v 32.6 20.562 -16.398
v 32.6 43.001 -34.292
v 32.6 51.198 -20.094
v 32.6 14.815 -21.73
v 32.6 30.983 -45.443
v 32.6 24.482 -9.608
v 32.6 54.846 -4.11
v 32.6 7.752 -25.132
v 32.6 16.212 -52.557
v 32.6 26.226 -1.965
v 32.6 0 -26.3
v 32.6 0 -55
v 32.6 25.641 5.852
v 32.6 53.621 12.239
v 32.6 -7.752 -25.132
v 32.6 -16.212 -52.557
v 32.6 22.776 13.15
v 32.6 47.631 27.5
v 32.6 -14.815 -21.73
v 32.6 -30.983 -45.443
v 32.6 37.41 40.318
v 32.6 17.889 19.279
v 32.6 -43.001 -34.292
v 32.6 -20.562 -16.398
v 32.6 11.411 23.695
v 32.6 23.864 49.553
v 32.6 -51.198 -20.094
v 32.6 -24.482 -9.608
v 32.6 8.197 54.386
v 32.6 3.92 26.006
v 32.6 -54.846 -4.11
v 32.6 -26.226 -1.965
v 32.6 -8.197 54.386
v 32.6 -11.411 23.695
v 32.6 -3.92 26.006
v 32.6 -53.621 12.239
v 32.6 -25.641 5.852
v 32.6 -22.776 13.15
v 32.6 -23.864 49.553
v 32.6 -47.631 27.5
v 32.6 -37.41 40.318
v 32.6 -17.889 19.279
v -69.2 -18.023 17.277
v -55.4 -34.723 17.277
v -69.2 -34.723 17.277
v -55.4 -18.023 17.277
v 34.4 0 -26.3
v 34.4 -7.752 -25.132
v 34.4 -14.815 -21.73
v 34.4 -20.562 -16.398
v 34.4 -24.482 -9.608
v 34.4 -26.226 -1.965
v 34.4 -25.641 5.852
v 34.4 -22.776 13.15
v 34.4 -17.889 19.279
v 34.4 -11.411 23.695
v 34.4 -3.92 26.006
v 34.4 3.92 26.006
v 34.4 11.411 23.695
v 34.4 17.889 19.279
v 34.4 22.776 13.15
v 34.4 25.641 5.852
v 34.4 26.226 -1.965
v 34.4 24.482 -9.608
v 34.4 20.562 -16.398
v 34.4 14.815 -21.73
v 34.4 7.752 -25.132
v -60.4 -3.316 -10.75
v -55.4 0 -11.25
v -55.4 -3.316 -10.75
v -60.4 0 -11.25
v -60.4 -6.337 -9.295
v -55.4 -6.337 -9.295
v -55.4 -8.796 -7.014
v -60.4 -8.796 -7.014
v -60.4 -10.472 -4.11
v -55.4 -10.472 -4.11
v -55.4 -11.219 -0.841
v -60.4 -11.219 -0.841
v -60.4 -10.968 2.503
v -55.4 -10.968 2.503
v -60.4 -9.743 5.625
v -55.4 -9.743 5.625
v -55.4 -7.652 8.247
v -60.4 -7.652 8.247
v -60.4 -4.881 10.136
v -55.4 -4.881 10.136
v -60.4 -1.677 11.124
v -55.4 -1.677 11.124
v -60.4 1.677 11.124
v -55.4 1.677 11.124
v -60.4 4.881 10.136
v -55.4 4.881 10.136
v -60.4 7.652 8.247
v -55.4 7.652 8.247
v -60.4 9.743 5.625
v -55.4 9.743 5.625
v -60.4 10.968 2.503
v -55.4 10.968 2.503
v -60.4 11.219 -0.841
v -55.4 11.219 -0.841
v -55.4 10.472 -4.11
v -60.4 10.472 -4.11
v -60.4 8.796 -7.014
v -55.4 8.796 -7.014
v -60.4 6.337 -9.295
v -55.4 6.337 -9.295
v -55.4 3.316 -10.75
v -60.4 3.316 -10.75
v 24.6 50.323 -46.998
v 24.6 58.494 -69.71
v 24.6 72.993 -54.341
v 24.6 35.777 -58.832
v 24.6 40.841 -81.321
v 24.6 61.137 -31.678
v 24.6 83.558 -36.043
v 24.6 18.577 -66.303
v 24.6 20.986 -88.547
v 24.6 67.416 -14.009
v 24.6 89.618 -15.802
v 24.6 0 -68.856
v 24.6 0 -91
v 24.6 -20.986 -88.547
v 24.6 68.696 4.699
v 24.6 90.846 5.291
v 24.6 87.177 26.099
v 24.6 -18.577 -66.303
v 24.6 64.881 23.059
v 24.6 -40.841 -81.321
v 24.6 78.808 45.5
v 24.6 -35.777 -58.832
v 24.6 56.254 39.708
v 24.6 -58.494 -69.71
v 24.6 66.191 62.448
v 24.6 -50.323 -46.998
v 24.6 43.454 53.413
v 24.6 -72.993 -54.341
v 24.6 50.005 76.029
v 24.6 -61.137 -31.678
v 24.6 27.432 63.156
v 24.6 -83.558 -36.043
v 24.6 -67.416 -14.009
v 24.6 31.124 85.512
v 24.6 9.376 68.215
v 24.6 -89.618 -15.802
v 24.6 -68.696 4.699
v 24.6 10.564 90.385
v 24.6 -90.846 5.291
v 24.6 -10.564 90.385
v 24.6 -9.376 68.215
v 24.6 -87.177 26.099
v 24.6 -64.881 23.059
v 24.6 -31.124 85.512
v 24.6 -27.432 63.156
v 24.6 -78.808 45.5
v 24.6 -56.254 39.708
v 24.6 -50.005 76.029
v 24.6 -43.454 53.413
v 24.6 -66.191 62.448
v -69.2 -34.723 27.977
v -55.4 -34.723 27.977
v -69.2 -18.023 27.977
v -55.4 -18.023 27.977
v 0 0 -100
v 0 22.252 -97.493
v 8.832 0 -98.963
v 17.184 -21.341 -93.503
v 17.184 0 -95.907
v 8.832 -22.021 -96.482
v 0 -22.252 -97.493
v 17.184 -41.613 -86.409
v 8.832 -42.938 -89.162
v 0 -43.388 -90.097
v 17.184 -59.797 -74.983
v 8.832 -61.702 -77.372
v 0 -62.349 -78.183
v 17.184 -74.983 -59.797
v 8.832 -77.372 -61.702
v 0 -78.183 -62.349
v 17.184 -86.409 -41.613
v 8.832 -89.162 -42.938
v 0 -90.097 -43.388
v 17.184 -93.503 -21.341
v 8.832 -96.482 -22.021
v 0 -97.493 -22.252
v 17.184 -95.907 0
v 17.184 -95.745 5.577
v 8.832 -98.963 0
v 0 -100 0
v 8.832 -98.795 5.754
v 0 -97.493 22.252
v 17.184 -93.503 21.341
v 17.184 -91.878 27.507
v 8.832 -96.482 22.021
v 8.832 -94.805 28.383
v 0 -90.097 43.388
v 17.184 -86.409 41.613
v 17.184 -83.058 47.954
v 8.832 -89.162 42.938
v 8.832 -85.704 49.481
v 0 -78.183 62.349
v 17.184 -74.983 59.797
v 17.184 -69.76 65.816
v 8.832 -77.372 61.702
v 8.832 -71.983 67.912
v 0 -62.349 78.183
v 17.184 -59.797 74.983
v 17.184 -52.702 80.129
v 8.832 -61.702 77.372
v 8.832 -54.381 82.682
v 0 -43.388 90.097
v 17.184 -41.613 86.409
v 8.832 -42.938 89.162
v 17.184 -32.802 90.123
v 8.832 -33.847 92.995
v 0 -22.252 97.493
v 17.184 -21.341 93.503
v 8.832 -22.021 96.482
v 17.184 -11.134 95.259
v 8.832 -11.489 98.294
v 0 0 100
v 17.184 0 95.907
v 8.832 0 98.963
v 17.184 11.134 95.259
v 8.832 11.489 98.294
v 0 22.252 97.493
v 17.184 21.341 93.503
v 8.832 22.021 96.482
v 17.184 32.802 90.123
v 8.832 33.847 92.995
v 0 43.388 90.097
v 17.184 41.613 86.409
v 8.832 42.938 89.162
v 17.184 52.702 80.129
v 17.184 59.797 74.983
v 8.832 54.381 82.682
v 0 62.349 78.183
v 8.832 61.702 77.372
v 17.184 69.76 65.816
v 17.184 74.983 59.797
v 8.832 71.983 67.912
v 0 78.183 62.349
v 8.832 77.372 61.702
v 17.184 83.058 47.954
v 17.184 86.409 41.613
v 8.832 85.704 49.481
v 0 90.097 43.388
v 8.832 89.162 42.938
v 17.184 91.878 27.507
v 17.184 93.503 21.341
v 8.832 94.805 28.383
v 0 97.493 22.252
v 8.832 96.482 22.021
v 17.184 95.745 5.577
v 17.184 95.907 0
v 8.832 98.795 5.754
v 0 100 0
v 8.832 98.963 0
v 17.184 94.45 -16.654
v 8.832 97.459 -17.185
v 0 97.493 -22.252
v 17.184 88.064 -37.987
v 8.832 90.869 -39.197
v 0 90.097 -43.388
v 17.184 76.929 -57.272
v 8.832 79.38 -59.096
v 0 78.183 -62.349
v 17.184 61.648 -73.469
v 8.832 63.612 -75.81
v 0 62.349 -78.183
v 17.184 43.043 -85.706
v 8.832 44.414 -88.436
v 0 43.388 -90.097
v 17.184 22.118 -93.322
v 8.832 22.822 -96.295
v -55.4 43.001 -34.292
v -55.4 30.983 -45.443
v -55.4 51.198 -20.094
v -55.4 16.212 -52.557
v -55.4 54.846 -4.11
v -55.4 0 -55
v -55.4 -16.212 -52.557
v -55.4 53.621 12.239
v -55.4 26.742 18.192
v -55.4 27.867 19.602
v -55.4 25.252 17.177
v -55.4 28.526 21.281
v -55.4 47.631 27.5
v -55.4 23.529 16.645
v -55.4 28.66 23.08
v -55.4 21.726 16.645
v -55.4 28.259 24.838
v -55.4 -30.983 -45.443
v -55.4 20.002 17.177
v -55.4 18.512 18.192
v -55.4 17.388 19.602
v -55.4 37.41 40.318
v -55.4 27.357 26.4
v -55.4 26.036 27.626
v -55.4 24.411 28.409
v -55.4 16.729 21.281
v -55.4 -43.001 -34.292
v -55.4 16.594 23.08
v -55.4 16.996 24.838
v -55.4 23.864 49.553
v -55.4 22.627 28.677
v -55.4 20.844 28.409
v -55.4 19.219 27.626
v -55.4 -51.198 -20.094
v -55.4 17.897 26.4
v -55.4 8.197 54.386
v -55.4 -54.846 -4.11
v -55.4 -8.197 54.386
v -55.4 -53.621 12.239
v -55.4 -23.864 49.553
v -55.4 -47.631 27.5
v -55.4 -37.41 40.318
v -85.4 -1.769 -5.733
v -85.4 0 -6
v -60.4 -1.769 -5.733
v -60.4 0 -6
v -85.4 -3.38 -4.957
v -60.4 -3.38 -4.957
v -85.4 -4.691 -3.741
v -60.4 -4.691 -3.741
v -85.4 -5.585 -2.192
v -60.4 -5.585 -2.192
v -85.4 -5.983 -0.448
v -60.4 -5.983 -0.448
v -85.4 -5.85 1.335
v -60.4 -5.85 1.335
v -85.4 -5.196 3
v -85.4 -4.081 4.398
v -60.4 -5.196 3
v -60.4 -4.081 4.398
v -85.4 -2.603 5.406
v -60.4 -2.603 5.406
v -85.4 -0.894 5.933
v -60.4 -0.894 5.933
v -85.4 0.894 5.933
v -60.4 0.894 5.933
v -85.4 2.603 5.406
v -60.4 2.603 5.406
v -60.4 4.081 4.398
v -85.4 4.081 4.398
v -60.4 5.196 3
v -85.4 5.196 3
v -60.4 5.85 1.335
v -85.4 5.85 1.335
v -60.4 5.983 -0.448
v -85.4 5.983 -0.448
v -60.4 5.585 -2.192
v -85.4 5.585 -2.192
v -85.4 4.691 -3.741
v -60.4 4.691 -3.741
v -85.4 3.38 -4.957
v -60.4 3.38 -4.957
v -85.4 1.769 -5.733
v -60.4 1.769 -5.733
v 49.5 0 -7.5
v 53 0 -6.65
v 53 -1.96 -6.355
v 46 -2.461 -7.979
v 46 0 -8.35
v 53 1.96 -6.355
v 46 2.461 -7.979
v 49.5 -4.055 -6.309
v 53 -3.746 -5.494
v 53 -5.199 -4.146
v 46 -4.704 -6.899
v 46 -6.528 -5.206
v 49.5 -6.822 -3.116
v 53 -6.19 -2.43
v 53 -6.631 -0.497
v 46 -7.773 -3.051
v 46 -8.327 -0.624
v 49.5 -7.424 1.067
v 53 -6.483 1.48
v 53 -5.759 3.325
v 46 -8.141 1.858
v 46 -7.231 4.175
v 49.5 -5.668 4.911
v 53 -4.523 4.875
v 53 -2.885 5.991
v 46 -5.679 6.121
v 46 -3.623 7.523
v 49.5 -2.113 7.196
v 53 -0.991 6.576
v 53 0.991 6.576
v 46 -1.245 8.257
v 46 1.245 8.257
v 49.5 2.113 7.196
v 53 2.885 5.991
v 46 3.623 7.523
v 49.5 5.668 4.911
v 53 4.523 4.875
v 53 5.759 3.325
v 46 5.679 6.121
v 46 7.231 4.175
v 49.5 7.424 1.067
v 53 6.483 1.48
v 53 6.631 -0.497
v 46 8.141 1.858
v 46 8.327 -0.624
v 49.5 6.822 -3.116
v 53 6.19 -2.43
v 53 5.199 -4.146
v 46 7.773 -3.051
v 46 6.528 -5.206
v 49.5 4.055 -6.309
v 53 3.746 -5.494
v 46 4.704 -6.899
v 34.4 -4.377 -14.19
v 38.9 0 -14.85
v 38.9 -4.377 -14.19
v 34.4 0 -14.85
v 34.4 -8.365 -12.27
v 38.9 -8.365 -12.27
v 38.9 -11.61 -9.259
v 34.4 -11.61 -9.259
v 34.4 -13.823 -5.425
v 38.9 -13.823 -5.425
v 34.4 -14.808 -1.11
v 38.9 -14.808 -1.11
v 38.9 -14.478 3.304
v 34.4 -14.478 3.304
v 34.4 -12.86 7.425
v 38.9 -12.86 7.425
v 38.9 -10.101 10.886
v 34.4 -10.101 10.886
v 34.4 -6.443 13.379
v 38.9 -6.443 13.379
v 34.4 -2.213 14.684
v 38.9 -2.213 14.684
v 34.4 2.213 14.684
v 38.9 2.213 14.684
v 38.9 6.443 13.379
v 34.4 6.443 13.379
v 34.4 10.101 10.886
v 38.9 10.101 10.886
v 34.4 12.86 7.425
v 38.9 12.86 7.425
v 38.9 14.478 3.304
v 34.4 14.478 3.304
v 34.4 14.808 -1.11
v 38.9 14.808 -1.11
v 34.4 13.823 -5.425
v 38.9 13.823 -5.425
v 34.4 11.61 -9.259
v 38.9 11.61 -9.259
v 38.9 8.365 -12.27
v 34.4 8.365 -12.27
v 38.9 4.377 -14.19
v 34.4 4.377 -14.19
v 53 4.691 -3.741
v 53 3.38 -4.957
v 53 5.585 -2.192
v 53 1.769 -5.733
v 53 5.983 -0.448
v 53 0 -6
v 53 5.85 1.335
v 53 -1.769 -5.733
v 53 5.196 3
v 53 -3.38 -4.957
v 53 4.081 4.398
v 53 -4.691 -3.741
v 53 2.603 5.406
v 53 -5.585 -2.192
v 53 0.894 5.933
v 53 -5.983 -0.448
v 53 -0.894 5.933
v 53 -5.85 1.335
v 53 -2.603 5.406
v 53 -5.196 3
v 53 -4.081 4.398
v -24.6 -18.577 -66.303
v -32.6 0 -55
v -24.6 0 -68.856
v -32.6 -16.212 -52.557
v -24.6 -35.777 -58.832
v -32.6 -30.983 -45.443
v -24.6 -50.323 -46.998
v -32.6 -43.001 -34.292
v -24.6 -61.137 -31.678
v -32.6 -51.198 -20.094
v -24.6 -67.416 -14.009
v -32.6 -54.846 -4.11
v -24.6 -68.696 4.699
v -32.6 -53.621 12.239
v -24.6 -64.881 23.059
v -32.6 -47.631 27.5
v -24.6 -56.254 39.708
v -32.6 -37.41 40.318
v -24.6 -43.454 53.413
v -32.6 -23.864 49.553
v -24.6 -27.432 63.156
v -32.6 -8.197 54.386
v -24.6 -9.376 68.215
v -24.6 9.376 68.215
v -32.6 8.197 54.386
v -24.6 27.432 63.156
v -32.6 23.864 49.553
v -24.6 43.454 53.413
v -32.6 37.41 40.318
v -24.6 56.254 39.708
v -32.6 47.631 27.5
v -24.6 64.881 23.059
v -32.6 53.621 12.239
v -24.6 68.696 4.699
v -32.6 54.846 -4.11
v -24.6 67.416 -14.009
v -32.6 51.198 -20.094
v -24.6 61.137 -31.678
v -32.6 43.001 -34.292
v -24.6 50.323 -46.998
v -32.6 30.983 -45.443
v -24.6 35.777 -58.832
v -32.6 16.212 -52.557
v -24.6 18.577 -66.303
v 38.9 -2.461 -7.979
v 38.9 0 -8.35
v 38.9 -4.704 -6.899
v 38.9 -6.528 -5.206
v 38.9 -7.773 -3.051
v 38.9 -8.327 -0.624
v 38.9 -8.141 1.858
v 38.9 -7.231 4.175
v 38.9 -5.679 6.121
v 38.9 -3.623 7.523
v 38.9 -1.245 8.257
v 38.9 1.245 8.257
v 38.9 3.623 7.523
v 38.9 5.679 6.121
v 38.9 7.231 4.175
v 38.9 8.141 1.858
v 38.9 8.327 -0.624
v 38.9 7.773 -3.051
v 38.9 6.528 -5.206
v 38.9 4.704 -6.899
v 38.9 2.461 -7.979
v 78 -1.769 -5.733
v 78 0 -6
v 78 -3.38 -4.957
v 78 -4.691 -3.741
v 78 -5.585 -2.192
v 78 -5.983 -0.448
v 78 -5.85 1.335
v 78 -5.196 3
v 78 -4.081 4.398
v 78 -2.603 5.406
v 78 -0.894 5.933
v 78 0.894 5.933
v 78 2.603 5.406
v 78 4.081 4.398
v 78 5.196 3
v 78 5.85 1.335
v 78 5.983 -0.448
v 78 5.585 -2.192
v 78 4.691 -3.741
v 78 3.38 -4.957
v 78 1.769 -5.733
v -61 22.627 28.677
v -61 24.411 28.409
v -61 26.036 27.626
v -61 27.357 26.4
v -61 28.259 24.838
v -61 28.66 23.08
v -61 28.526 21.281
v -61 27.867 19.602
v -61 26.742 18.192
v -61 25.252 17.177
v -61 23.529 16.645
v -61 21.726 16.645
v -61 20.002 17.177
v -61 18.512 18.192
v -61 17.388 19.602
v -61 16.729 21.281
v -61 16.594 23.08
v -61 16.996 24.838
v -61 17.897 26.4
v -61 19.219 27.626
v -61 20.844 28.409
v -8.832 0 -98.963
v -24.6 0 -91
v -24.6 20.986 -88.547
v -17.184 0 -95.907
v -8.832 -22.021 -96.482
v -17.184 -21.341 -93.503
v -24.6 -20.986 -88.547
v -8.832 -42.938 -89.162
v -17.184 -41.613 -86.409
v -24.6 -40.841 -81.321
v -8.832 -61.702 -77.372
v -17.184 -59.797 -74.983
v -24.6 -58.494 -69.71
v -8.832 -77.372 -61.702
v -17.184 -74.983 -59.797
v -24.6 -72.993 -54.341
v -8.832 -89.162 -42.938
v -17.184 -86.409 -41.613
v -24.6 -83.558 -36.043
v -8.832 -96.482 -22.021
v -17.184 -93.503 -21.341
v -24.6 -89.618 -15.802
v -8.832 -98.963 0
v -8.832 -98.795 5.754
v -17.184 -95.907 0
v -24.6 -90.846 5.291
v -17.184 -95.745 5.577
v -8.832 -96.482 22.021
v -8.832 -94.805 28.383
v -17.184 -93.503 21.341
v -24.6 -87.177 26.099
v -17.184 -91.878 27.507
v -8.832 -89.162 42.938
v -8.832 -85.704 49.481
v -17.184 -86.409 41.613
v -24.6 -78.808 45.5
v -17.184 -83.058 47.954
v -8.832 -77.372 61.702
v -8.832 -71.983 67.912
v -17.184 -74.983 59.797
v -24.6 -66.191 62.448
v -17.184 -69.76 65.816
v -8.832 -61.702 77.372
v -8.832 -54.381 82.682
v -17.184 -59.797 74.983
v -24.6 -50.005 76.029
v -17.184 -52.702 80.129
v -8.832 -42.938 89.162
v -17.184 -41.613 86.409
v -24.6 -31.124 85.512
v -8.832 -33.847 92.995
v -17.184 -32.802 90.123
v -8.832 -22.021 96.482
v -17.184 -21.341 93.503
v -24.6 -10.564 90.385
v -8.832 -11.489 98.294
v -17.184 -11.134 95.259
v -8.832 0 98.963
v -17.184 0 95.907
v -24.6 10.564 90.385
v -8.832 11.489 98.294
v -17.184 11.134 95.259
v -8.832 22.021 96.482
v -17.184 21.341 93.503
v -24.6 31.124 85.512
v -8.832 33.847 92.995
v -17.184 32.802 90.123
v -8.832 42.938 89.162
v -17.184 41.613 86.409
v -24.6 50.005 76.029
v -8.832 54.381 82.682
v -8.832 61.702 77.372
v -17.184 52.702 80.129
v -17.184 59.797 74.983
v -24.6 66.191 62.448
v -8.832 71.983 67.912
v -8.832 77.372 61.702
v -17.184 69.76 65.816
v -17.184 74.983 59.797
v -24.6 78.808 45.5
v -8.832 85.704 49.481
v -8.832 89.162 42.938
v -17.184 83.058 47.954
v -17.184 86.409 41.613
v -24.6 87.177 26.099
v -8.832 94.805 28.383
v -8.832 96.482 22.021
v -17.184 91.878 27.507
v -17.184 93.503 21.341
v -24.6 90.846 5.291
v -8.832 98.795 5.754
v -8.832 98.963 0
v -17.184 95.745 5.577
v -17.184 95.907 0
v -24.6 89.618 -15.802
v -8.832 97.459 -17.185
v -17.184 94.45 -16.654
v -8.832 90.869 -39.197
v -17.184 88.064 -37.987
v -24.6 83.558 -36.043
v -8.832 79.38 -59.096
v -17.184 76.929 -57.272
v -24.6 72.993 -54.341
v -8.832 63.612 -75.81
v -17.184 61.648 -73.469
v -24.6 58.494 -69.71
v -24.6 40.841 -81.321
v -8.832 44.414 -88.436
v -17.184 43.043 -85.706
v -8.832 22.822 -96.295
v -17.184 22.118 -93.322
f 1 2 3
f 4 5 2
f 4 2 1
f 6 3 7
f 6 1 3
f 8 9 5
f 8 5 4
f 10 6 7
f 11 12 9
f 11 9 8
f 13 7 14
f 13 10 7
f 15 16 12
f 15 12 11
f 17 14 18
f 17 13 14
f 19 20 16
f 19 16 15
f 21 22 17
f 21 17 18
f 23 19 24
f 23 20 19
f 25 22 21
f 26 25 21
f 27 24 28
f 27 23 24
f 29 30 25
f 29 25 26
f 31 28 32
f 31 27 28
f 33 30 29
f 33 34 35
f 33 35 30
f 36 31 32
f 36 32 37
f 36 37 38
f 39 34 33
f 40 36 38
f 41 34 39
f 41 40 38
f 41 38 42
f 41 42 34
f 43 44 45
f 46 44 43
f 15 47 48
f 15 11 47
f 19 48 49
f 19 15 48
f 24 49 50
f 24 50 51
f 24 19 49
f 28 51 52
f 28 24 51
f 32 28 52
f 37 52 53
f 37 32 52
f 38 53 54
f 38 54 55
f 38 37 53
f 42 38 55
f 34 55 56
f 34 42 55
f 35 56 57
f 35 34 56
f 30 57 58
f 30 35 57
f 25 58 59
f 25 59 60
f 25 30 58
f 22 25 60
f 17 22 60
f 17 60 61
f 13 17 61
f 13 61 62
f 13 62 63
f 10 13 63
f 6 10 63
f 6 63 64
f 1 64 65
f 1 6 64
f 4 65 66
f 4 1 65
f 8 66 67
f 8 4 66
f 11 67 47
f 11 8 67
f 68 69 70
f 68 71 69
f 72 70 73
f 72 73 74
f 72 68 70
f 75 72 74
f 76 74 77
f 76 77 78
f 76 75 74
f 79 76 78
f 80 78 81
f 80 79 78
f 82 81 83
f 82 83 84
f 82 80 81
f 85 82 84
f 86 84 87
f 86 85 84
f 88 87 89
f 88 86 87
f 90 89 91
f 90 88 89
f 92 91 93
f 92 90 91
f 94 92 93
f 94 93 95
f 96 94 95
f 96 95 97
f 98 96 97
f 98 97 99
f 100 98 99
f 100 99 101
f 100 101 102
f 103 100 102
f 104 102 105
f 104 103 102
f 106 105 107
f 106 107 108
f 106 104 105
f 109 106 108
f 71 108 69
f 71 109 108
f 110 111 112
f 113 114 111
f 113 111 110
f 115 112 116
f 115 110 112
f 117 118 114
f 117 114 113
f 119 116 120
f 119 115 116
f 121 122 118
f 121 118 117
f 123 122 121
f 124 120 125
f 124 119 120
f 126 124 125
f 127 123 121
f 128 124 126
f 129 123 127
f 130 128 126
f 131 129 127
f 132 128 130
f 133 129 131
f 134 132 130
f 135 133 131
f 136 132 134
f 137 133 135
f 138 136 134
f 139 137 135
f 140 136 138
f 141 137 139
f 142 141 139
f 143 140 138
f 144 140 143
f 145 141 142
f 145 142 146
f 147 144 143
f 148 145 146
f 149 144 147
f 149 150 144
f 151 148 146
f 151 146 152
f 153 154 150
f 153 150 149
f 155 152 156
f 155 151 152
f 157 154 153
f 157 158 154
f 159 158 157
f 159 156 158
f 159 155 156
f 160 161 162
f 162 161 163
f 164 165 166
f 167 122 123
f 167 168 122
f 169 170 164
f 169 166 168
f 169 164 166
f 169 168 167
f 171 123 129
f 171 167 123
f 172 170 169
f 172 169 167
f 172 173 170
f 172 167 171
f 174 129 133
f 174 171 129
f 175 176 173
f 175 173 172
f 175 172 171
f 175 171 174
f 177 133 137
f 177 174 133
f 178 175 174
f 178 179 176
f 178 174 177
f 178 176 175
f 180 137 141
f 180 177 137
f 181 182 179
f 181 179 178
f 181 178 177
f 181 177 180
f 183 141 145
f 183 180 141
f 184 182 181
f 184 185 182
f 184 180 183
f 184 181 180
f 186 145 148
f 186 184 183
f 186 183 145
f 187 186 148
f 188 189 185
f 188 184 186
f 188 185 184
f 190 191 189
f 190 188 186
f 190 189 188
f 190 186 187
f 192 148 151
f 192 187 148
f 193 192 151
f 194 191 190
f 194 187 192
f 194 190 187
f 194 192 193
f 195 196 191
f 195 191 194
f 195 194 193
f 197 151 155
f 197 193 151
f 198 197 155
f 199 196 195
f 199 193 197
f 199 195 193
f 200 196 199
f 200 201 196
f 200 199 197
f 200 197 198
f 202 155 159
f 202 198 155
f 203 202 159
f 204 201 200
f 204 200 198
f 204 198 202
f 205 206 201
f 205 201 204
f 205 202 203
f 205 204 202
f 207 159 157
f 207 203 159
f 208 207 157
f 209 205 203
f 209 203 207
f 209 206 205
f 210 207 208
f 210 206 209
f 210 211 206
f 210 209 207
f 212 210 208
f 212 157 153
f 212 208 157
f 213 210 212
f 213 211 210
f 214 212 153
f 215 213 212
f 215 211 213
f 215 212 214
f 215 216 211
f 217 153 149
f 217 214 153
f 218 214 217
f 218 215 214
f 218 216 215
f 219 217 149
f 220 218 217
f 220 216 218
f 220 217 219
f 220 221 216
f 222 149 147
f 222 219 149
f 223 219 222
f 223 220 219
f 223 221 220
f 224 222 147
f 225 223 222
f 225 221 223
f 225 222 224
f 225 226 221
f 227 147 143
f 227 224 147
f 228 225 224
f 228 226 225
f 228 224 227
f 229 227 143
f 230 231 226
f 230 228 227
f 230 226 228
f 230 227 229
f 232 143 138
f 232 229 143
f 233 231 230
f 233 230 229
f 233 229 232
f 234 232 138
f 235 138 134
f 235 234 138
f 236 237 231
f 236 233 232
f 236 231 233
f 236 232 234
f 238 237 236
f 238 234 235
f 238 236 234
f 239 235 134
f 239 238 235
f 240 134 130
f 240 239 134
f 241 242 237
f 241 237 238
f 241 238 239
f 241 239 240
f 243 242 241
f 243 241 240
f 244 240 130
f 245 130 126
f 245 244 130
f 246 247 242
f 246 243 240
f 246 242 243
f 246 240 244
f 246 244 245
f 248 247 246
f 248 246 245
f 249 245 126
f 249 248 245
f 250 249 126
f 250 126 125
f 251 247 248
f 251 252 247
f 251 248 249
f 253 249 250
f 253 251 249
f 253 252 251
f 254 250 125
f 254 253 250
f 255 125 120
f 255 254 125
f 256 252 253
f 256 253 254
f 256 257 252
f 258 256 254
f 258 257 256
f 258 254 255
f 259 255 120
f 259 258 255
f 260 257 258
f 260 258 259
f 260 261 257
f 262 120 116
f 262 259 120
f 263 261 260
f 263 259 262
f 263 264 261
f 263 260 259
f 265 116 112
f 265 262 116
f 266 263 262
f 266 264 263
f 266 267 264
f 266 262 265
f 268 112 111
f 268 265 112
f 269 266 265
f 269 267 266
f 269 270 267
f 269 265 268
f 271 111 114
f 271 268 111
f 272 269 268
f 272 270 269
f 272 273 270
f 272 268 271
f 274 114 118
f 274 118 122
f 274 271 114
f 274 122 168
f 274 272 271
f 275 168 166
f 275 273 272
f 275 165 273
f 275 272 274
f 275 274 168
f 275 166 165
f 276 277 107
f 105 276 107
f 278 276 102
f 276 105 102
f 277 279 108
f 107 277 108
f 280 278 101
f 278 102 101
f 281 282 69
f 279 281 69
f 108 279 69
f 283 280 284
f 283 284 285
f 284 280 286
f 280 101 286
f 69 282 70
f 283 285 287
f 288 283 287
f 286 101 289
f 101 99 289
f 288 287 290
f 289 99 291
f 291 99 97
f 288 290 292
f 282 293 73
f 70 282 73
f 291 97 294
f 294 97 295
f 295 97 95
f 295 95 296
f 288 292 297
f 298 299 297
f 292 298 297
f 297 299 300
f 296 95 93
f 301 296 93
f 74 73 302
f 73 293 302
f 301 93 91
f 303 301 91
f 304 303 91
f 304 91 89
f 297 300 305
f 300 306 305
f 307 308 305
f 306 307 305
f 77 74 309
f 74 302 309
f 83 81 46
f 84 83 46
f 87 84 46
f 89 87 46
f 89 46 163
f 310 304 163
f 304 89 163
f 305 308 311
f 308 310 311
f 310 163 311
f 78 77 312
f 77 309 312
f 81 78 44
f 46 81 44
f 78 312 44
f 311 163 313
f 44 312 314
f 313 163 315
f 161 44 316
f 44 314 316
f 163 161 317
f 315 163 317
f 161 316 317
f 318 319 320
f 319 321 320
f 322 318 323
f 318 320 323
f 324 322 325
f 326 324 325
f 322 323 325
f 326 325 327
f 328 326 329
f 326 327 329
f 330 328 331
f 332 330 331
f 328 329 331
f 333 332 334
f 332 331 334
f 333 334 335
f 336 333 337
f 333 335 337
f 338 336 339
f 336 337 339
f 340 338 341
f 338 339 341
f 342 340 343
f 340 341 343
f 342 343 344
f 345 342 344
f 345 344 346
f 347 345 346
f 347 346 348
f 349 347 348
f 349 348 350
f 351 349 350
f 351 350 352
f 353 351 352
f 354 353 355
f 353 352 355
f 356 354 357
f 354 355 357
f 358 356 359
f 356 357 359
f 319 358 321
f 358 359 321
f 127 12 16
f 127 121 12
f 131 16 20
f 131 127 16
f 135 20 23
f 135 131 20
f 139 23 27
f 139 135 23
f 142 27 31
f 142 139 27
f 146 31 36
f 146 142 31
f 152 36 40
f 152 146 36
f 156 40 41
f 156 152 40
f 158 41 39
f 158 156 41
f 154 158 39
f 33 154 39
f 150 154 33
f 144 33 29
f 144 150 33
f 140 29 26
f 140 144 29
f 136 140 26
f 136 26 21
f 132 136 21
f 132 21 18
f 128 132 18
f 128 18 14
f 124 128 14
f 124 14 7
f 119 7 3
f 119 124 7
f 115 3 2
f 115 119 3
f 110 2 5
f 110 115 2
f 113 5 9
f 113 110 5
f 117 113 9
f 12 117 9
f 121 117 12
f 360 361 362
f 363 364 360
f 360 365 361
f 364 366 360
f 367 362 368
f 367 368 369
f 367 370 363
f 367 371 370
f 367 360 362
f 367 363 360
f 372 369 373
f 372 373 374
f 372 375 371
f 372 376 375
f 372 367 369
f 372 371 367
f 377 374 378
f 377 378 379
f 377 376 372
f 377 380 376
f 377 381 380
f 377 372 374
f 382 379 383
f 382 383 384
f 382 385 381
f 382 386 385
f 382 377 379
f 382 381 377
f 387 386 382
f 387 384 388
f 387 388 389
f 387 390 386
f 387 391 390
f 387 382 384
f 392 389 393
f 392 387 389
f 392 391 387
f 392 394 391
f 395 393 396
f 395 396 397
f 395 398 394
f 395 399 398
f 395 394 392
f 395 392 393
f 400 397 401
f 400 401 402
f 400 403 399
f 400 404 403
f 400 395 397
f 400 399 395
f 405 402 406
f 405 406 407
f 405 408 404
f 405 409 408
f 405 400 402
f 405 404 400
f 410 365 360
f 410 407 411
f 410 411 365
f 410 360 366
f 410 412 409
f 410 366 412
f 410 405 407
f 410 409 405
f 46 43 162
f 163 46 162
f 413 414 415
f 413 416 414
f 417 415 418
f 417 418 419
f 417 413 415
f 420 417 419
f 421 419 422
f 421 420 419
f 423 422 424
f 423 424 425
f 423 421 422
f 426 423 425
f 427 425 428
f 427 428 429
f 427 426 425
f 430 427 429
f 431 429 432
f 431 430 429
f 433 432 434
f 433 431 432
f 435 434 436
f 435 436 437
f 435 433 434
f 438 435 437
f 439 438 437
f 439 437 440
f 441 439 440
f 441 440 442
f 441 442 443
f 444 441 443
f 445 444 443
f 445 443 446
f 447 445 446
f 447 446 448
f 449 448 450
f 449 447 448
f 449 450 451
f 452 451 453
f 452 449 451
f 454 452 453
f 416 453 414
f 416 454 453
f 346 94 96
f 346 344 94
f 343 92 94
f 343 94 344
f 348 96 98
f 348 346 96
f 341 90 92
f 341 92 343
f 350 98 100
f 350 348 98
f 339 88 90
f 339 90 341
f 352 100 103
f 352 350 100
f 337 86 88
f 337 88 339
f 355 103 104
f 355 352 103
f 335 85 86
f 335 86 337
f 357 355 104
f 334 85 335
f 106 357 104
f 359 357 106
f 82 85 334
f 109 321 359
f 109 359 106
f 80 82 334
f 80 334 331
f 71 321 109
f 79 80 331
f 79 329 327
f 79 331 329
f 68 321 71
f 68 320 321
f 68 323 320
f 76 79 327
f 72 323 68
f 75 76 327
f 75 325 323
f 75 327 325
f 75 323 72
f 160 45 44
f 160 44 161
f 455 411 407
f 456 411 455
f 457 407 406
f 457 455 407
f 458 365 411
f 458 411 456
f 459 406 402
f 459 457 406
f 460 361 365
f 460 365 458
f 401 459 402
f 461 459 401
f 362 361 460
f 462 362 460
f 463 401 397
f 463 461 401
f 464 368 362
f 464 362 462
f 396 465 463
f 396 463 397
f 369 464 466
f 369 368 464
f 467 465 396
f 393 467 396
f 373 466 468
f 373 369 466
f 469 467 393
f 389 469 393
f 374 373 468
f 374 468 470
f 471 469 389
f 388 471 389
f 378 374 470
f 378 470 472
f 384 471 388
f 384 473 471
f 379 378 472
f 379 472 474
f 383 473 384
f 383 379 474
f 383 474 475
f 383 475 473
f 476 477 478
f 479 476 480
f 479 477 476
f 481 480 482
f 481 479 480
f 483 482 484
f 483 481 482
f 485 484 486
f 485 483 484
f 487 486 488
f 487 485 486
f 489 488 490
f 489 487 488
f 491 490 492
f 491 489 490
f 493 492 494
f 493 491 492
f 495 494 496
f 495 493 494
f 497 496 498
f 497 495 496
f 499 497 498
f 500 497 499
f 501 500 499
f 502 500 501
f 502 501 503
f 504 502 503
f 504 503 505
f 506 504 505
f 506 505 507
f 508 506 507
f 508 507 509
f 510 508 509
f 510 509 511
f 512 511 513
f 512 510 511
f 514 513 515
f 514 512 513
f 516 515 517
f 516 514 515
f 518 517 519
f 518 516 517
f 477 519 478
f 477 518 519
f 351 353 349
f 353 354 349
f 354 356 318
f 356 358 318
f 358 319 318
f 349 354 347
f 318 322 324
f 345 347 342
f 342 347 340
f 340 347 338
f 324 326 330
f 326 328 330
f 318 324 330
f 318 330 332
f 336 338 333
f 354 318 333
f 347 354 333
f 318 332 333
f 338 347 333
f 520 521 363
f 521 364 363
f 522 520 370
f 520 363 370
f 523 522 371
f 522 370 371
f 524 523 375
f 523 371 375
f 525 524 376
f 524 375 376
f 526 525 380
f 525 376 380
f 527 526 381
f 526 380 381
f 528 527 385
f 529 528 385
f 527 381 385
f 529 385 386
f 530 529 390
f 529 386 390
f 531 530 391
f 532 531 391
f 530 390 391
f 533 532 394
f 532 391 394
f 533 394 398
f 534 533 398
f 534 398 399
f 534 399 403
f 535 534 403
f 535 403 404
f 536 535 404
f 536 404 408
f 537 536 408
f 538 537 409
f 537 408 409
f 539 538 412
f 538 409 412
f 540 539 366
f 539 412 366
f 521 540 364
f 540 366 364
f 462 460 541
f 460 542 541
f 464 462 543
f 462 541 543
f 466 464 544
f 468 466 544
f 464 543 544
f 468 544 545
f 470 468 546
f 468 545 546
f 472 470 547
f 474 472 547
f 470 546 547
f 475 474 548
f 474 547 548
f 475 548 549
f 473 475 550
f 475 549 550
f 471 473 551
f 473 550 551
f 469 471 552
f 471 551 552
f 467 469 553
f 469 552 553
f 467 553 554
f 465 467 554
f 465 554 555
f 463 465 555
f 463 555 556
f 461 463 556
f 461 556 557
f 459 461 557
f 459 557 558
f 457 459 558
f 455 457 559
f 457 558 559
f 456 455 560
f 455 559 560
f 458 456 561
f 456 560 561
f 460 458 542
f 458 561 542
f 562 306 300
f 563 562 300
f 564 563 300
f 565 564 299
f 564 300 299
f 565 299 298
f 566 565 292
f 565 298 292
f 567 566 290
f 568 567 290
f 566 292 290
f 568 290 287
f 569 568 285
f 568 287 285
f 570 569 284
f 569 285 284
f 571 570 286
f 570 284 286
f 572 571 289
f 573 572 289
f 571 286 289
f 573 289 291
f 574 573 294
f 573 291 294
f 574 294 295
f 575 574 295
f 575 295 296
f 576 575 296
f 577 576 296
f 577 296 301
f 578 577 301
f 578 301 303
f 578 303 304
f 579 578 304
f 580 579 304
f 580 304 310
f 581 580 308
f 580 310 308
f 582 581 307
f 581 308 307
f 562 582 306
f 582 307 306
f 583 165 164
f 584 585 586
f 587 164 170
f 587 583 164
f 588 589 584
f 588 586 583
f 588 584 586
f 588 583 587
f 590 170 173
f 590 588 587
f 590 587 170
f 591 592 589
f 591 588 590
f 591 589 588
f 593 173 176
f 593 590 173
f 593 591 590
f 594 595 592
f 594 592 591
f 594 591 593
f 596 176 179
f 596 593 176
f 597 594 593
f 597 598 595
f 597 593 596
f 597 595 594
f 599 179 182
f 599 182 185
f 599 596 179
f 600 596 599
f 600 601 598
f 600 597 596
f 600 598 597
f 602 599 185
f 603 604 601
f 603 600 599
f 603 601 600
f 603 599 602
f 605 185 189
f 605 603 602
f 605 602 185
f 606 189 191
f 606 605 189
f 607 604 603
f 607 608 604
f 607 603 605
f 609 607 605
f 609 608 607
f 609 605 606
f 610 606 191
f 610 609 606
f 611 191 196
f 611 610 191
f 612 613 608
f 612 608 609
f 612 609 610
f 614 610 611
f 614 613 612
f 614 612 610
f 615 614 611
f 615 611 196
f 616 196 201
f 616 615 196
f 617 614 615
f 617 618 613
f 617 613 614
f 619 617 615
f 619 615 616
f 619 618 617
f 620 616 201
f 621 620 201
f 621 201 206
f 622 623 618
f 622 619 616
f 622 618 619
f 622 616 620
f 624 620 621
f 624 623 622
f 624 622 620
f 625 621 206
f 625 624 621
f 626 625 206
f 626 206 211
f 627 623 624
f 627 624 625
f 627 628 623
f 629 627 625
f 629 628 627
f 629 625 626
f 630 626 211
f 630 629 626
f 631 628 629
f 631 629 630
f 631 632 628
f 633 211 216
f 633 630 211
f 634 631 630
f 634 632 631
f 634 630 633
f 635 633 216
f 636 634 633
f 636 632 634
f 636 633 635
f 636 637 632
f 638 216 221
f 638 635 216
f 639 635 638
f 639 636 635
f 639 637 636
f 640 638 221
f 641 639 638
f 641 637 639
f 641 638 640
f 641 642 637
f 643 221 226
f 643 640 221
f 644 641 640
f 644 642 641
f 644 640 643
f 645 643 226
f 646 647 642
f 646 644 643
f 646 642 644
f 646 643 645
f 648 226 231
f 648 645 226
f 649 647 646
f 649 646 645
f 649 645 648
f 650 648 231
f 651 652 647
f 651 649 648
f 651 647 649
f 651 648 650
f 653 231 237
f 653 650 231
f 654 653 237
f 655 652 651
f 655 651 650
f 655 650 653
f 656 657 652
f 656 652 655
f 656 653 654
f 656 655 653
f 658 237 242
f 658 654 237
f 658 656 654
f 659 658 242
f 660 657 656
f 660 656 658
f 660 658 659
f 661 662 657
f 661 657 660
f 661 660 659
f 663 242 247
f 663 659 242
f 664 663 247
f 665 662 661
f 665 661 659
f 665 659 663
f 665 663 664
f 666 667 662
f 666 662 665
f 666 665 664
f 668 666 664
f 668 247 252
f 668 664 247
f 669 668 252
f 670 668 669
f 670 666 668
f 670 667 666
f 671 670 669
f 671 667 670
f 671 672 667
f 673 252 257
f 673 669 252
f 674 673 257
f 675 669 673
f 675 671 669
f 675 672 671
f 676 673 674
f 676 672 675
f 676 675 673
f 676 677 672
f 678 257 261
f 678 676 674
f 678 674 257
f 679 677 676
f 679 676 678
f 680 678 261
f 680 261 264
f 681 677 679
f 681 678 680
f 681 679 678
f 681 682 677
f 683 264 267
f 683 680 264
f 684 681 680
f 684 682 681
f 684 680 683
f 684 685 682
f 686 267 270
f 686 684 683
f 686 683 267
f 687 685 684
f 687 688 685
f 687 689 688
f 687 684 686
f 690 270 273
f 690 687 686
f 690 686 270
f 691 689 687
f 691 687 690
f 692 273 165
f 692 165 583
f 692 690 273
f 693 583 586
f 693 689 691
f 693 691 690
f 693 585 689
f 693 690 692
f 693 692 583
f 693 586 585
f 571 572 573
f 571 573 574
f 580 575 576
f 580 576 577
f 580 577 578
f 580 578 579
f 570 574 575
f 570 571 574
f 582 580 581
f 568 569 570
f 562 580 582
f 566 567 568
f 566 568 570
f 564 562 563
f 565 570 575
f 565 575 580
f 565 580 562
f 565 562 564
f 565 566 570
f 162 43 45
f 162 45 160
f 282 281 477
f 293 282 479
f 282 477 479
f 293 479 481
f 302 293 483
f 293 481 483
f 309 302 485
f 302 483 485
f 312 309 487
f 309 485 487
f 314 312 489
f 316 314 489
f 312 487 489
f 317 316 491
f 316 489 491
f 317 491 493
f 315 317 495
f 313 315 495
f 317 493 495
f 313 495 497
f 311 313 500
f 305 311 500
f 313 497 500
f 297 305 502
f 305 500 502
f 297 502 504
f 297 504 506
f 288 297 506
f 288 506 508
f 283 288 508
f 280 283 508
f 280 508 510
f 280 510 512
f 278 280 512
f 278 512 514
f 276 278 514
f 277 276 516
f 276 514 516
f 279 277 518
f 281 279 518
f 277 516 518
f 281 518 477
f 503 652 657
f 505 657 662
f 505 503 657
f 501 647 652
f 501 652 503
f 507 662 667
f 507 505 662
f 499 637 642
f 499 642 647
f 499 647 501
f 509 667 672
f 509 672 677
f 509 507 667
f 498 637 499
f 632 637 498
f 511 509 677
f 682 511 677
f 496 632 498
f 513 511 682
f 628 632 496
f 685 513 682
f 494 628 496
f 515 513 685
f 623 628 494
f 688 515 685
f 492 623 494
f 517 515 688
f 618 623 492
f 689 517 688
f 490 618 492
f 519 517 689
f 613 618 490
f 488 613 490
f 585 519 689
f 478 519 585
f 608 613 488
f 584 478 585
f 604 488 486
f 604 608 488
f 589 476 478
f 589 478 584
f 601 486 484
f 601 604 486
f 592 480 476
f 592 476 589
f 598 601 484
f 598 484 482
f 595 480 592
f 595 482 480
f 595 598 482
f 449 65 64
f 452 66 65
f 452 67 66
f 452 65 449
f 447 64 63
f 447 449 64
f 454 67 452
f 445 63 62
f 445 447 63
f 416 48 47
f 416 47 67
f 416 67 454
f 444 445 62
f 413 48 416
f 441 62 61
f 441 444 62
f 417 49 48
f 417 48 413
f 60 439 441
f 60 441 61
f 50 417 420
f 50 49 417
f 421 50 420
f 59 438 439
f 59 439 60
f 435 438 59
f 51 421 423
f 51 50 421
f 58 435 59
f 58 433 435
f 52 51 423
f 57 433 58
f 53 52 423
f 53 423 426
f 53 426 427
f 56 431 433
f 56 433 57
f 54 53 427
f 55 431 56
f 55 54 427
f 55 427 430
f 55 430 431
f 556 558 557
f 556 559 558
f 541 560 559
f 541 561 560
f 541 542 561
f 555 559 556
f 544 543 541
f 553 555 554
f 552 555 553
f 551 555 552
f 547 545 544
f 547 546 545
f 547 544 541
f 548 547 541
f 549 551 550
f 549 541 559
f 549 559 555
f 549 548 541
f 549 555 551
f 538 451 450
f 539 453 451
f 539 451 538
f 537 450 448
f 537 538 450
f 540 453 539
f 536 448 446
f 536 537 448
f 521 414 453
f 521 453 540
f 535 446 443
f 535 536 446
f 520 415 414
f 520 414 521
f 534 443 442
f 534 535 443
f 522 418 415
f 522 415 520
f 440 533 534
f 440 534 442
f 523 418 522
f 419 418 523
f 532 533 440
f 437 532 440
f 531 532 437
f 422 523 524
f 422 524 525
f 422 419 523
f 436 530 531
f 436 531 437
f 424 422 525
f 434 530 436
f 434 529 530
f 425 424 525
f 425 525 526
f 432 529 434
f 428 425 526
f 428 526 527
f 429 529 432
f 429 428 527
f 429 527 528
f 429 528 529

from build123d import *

# Parameters (mm, degrees)
SKETCH2_R           = 6.05
BOSS_EXTRUDE1_DEPTH = 5.6
SKETCH2_3_W         = 10.7
SKETCH2_3_H         = 16.7
BOSS_EXTRUDE2_DEPTH = 13.8


with BuildPart() as part:
    # Sketch1 → Revolve1 (revolve)
    with BuildSketch(Plane.XY):
        with BuildLine():
            Line((78, 0), (78, 6))
            Line((78, 6), (53, 6))
            Line((53, 6), (53, 6.65))
            Line((53, 6.65), (46, 8.35))
            Line((46, 8.35), (38.9, 8.35))
            Line((38.9, 8.35), (38.9, 14.85))
            Line((38.9, 14.85), (34.4, 14.85))
            Line((34.4, 14.85), (34.4, 26.3))
            Line((34.4, 26.3), (32.6, 26.3))
            Line((32.6, 26.3), (32.6, 55))
            Line((32.6, 55), (24.6, 68.856406461))
            Line((24.6, 68.856406461), (24.6, 91))
            ThreePointArc((24.6, 91), (0, 100), (-24.6, 91))
            Line((-24.6, 91), (-24.6, 68.856406461))
            Line((-24.6, 68.856406461), (-32.6, 55))
            Line((-32.6, 55), (-55.4, 55))
            Line((-55.4, 55), (-55.4, 11.25))
            Line((-55.4, 11.25), (-60.4, 11.25))
            Line((-60.4, 11.25), (-60.4, 6))
            Line((-60.4, 6), (-85.4, 6))
            Line((-85.4, 6), (-85.4, 0))
            Line((-85.4, 0), (78, 0))
        make_face()
    revolve(axis=Axis((0, 0, 0), (-1, 0, 0)))

    # Sketch2 → Boss-Extrude1 (add)
    with BuildSketch(Plane.ZY.offset(55.4)):
        with Locations((22.627416998, 22.627416998)):
            Circle(SKETCH2_R)
    extrude(amount=BOSS_EXTRUDE1_DEPTH)

    # Sketch2<3> → Boss-Extrude2 (add)
    with BuildSketch(Plane.ZY.offset(55.4)):
        with Locations((22.627416998, -26.372583002)):
            Rectangle(SKETCH2_3_W, SKETCH2_3_H)
    extrude(amount=BOSS_EXTRUDE2_DEPTH)


solid = part.part
